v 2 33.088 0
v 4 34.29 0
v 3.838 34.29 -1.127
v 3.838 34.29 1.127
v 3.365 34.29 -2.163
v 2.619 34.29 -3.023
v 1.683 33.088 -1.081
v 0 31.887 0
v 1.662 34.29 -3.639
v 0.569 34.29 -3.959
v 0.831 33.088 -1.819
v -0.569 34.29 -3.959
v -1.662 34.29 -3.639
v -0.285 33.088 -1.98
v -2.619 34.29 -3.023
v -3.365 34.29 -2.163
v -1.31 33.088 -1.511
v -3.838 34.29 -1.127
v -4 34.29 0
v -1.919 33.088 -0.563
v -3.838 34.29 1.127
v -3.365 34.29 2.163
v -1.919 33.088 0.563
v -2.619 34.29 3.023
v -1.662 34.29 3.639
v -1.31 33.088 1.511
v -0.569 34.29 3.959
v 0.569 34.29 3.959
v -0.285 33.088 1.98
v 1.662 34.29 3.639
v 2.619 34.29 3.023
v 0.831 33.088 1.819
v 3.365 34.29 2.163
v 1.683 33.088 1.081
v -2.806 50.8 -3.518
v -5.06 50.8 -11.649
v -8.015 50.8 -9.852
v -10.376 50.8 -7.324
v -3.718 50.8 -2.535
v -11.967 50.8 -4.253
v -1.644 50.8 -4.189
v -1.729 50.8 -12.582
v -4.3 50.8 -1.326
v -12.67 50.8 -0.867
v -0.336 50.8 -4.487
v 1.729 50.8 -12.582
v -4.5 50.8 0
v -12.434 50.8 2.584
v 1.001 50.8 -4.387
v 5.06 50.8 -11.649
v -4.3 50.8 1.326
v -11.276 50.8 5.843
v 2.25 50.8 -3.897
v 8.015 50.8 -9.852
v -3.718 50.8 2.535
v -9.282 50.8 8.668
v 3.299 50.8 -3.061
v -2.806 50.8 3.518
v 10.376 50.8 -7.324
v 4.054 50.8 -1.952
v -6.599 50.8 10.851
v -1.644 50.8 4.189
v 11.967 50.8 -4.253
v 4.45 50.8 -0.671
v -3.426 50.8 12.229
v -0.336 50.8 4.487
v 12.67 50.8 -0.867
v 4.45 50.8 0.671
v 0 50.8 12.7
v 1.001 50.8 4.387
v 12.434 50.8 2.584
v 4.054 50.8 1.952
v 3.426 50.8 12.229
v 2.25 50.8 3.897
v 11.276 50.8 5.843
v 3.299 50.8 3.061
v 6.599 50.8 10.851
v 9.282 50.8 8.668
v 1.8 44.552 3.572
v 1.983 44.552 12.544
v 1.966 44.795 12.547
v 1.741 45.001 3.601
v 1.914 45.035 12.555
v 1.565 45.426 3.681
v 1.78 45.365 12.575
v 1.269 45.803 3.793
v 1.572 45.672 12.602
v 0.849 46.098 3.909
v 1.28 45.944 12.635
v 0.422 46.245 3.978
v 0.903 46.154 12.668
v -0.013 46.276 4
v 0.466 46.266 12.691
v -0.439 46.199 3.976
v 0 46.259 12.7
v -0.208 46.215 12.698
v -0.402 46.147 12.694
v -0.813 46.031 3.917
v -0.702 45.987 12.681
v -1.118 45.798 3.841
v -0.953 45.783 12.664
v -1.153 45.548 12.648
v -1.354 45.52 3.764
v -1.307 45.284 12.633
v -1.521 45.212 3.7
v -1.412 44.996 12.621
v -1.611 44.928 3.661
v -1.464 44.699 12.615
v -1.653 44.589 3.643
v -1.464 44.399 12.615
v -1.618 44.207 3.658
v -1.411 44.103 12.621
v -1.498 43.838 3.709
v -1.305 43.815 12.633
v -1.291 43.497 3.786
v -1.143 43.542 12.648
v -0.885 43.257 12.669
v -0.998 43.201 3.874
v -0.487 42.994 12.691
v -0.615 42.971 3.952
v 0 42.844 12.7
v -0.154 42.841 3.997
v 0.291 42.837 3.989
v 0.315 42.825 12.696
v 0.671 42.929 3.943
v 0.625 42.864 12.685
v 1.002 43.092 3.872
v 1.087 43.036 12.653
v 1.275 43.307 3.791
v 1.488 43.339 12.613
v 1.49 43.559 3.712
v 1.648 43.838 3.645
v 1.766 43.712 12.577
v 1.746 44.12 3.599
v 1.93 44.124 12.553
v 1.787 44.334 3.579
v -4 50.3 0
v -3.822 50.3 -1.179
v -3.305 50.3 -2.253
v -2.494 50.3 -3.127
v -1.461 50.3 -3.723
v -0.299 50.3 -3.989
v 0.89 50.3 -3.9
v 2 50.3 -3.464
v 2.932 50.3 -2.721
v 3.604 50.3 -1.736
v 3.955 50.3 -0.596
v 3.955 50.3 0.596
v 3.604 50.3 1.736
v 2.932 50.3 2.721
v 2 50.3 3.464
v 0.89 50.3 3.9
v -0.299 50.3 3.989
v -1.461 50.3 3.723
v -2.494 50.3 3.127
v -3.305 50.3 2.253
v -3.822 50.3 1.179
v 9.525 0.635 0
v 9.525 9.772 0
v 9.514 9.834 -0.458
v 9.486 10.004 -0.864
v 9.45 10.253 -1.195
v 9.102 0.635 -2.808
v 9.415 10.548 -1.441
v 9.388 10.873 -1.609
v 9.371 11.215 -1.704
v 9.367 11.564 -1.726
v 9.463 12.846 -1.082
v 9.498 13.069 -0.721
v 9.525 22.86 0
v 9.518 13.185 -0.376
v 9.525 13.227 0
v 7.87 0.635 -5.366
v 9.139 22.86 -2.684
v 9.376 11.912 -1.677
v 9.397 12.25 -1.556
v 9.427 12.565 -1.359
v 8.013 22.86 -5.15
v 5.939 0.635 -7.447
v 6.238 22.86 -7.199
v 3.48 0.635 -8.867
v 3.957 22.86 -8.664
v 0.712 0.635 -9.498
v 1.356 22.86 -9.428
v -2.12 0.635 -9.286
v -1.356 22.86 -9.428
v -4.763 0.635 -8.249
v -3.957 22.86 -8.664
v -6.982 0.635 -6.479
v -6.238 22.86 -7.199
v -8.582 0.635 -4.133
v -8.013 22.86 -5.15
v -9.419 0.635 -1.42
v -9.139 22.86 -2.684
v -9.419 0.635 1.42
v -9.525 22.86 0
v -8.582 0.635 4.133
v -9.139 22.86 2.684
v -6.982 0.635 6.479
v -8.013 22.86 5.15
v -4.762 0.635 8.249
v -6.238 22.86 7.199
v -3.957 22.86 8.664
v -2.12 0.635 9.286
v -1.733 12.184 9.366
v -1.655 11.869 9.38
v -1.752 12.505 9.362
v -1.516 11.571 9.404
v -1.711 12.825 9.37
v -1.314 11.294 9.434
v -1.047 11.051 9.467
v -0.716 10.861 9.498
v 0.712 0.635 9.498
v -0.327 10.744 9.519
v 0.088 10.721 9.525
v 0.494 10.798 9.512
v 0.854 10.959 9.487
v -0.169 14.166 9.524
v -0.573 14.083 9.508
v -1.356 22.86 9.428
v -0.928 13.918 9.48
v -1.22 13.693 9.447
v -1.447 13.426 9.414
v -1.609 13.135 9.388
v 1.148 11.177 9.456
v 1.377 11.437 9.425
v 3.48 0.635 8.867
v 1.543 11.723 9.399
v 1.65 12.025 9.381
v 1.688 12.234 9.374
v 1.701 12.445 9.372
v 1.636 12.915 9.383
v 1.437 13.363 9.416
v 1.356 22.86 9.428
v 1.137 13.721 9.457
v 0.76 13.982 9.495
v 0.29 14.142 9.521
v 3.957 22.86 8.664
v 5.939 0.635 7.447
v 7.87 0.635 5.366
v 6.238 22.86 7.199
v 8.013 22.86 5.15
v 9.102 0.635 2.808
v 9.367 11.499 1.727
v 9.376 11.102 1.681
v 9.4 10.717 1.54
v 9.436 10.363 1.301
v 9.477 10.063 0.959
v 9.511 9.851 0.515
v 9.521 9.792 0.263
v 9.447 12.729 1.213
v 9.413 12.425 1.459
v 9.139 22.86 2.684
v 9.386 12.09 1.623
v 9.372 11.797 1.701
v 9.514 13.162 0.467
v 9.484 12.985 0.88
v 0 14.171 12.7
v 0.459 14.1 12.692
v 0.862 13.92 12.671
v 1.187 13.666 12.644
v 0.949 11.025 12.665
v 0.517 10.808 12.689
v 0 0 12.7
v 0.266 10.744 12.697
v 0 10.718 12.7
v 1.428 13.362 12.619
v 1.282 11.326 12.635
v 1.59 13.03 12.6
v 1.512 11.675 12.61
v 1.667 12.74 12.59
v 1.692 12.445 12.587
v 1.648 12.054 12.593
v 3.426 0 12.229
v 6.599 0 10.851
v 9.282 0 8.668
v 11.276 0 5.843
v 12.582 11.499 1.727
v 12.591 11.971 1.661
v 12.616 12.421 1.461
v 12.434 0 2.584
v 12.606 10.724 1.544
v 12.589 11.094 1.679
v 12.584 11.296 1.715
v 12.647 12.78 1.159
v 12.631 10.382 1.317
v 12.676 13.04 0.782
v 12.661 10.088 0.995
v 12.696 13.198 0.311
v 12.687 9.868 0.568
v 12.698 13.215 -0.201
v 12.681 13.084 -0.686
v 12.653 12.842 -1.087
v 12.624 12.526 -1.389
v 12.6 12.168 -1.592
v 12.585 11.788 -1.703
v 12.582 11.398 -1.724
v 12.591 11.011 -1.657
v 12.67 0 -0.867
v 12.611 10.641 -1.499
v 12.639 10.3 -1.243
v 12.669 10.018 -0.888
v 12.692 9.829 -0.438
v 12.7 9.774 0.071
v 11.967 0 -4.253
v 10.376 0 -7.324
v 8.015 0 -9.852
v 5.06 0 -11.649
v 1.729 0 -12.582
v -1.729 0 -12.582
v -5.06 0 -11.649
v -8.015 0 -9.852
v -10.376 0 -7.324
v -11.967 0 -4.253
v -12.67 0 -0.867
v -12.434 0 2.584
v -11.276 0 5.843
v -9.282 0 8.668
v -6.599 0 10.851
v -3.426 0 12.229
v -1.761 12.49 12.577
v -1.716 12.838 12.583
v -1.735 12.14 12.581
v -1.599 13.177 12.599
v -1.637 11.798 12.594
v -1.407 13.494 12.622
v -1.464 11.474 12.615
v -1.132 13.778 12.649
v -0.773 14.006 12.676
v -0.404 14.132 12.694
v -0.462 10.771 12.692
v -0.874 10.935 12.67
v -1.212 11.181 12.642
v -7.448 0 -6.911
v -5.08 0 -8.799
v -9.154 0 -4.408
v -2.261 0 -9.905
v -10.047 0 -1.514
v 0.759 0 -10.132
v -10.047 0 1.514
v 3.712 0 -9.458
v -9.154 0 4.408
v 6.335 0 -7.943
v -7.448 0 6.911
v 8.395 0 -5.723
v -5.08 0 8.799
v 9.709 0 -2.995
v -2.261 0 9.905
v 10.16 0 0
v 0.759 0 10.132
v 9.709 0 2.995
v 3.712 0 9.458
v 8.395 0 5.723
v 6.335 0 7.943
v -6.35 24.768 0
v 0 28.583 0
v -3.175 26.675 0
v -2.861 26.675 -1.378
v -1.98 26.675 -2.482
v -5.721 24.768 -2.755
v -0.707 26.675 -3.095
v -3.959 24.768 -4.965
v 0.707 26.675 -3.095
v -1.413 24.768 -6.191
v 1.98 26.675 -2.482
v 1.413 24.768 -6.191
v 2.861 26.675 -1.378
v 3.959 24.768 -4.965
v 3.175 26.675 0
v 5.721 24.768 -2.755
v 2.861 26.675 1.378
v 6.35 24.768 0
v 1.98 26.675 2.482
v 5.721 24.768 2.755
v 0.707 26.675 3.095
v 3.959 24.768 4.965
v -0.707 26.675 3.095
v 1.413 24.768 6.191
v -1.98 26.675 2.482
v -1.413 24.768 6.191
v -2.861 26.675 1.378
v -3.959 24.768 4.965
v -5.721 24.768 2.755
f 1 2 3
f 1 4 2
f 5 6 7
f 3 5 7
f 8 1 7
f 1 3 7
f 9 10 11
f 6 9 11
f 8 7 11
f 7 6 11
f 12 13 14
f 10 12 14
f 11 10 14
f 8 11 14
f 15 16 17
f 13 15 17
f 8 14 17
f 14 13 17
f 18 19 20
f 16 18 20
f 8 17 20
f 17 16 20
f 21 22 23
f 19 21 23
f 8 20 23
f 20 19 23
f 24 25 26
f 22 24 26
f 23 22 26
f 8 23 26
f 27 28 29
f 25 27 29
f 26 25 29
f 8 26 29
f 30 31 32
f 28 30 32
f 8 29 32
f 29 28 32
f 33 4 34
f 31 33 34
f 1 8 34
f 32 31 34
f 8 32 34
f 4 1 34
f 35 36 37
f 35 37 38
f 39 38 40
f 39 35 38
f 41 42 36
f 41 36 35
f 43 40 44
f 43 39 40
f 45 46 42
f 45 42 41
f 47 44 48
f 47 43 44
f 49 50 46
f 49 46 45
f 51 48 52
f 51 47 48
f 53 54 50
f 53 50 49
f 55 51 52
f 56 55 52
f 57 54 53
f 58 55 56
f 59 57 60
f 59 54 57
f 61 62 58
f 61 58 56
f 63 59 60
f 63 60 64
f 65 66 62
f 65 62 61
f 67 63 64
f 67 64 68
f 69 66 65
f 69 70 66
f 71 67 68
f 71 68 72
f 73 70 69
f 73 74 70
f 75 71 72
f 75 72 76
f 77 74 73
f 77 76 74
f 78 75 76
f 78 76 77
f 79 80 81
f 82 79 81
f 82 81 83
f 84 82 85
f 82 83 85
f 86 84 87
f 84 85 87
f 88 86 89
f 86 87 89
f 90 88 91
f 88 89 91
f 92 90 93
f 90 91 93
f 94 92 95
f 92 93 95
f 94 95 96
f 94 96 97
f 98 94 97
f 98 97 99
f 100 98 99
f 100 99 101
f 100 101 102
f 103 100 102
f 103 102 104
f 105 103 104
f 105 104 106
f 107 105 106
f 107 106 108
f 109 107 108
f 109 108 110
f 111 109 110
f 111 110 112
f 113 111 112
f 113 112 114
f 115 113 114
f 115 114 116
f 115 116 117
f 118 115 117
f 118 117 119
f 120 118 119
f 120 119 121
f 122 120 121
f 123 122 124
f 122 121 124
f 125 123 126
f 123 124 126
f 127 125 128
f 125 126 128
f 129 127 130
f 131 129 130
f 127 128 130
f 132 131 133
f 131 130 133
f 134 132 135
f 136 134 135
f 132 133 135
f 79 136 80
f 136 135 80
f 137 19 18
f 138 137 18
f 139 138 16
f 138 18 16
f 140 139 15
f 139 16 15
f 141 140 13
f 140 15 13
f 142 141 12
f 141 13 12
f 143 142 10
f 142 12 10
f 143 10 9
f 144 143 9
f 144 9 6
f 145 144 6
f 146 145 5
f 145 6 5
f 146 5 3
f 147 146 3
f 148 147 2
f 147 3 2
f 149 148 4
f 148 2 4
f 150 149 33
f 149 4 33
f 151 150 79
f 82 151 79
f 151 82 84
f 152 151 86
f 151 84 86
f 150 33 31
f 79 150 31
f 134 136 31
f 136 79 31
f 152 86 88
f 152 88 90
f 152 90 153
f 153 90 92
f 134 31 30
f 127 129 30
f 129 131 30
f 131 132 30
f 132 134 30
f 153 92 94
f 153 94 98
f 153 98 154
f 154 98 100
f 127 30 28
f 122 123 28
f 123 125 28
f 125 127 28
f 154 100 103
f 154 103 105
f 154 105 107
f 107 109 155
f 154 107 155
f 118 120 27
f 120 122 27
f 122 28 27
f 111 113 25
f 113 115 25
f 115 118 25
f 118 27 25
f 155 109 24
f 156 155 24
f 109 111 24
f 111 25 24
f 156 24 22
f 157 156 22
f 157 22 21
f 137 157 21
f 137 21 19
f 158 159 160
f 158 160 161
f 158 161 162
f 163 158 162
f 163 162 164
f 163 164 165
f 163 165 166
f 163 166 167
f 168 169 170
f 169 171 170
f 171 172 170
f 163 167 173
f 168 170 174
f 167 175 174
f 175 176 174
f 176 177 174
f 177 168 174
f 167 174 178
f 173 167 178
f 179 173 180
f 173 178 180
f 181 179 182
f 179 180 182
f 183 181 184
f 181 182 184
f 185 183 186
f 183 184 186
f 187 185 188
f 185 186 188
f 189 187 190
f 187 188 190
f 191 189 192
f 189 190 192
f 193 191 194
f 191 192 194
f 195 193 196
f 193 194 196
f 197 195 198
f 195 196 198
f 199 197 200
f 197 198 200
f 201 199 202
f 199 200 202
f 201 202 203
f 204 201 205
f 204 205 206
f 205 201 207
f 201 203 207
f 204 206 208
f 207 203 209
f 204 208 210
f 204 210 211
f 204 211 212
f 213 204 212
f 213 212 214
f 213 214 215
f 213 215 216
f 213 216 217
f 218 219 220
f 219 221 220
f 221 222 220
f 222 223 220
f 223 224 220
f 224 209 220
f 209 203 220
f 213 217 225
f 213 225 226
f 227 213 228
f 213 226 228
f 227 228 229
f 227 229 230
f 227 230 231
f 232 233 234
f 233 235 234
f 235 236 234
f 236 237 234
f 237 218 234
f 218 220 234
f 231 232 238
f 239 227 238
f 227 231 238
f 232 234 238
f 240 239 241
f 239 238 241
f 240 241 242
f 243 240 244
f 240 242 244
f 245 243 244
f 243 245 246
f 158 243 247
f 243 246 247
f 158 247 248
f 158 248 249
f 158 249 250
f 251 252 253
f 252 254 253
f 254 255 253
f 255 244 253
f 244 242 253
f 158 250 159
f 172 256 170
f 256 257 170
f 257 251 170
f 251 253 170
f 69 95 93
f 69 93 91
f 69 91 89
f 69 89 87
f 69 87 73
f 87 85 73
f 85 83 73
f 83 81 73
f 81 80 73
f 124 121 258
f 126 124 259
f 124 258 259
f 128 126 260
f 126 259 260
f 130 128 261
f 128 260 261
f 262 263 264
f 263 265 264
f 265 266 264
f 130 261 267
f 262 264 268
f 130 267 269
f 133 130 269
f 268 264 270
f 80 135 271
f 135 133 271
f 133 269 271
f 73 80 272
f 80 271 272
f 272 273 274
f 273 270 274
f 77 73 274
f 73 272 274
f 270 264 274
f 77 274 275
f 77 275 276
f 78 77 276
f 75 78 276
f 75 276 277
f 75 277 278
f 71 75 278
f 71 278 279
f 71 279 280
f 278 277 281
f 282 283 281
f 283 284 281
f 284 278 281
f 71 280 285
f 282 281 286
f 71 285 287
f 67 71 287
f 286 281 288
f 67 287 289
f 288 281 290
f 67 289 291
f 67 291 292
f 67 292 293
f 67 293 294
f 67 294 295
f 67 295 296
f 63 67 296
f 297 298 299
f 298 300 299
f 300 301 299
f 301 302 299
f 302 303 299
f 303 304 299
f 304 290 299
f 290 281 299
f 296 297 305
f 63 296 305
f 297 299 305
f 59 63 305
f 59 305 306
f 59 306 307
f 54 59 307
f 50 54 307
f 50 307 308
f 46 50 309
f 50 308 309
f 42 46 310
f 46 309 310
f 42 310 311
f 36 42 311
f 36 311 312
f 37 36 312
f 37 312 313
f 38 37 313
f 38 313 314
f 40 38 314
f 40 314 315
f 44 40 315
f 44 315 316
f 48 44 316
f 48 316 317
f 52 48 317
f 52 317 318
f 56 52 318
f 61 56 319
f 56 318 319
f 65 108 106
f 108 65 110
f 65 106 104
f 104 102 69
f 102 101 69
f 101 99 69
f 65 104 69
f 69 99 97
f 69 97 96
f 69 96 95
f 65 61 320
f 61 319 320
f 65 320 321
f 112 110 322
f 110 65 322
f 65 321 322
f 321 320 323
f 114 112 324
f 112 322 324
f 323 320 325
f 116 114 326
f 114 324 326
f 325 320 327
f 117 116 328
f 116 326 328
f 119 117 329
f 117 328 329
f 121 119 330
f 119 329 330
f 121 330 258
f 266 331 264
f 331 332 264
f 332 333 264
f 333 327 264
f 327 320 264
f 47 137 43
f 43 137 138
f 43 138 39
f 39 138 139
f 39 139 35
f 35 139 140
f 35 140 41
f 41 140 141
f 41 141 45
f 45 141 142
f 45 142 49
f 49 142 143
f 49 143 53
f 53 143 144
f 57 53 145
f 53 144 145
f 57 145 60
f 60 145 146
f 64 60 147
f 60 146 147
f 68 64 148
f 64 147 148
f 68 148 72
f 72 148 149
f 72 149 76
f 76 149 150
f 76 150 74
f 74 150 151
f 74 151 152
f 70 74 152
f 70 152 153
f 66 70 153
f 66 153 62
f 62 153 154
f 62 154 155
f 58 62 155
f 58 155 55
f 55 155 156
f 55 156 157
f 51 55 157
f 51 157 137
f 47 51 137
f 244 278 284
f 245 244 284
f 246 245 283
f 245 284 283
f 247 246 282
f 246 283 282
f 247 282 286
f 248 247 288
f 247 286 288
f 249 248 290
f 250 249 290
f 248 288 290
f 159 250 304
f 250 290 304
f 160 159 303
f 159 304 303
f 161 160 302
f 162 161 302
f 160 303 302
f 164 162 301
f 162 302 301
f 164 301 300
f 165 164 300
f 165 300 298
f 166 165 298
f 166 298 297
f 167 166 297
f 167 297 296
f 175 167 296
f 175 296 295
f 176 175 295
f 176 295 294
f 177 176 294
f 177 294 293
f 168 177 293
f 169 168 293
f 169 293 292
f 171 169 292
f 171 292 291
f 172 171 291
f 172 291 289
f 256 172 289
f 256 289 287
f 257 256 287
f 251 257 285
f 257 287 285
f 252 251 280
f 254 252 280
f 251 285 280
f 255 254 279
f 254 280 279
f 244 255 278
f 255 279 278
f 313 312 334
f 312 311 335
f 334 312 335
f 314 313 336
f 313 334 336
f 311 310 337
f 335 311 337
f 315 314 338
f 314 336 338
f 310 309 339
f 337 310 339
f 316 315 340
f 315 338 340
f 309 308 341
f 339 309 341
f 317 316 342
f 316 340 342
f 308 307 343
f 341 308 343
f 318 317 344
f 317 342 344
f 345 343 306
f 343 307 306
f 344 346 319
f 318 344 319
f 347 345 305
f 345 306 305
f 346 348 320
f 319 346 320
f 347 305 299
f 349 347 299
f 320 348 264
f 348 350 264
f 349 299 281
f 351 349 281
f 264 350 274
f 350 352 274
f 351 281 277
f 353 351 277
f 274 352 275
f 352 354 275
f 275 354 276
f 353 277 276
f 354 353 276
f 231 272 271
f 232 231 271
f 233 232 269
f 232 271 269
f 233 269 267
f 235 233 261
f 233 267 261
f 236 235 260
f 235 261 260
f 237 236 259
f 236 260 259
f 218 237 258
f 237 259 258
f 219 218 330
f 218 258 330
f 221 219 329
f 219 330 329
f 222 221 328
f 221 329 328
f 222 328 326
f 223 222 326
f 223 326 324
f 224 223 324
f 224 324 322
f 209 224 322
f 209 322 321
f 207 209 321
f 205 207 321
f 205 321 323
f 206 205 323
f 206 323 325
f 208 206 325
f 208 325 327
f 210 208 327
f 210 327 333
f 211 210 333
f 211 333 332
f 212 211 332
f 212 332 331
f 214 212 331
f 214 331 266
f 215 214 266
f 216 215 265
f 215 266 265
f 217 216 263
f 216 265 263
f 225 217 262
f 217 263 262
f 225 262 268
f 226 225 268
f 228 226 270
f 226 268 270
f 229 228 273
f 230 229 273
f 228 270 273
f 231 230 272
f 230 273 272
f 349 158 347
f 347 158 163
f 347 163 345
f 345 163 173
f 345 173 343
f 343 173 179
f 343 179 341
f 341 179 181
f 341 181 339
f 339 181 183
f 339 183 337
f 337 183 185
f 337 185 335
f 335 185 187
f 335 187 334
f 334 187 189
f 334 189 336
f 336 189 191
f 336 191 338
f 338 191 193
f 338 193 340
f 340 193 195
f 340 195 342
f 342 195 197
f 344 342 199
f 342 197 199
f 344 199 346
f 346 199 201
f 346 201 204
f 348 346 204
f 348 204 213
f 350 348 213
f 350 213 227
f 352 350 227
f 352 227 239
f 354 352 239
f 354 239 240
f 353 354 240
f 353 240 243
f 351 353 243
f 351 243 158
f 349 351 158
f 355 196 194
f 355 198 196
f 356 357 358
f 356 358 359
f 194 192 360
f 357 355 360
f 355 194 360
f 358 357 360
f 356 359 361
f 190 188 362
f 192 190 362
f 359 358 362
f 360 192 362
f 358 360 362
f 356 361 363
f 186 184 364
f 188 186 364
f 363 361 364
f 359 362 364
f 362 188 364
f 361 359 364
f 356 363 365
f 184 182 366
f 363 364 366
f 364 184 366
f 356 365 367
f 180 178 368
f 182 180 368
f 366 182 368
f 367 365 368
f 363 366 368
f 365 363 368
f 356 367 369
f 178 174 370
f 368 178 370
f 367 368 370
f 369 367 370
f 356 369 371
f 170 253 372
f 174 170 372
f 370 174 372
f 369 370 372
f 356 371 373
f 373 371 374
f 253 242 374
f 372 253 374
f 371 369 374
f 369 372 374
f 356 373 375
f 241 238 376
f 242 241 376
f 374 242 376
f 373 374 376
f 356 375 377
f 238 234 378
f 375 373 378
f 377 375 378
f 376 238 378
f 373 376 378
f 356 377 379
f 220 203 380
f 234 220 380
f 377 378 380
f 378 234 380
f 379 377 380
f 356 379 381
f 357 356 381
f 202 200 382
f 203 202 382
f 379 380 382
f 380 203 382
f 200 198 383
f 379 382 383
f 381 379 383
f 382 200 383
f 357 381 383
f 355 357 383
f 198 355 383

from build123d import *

# Parameters (mm, degrees)
SKETCH1_R                             = 12.7
BOSS_EXTRUDE1_DEPTH                   = 50.8
F_8_0_8_DIAMETER_HOLE1_D              = 8
F_8_0_8_DIAMETER_HOLE1_DEPTH          = 16.51
F_8_0_8_DIAMETER_HOLE1_CSINK_D        = 9
F_8_0_8_DIAMETER_HOLE1_CSINK_ANGLE    = 90
F_8_0_8_DIAMETER_HOLE1_TIP            = 2.403442476
F_8_32_TAPPED_HOLE1_REACH             = 54.894
F_8_32_TAPPED_HOLE1_BORE_R            = 1.7272
F_3_4_0_75_DIAMETER_HOLE1_D           = 19.05
F_3_4_0_75_DIAMETER_HOLE1_DEPTH       = 22.86
F_3_4_0_75_DIAMETER_HOLE1_CSINK_D     = 20.32
F_3_4_0_75_DIAMETER_HOLE1_CSINK_ANGLE = 90
F_3_4_0_75_DIAMETER_HOLE1_TIP         = 5.723197396
TAP_DRILL_FOR_8_32_TAP1_REACH         = 49.733
TAP_DRILL_FOR_8_32_TAP1_BORE_R        = 1.7272
TAP_DRILL_FOR_8_32_TAP2_REACH         = 50.487
TAP_DRILL_FOR_8_32_TAP2_BORE_R        = 1.7272


with BuildPart() as part:
    # Sketch1 → Boss-Extrude1 (new body)
    with BuildSketch(Plane(origin=(0, 0, 0), x_dir=(1, 0, 0), z_dir=(0, 1, 0))):
        with Locations(Location((0, 0, 0), (0, 0, 270))):
            Circle(SKETCH1_R)
    extrude(amount=BOSS_EXTRUDE1_DEPTH)

    # Ø8.0 (8) Diameter Hole1
    with Locations(Plane(origin=(0, 50.8, 0), x_dir=(1, 0, 0), z_dir=(0, 1, 0))):
        with Locations((0, 0)):
            CounterSinkHole(F_8_0_8_DIAMETER_HOLE1_D / 2, F_8_0_8_DIAMETER_HOLE1_CSINK_D / 2, depth=F_8_0_8_DIAMETER_HOLE1_DEPTH, counter_sink_angle=F_8_0_8_DIAMETER_HOLE1_CSINK_ANGLE)
            with Locations((0, 0, -(F_8_0_8_DIAMETER_HOLE1_DEPTH + F_8_0_8_DIAMETER_HOLE1_TIP / 2))):  # 118° drill point
                Cone(0, F_8_0_8_DIAMETER_HOLE1_D / 2, F_8_0_8_DIAMETER_HOLE1_TIP, mode=Mode.SUBTRACT)

    # #8-32 Tapped Hole1 bore (on position points) → #8-32 Tapped Hole1 (cut, up to next)
    with BuildSketch(Plane(origin=(0.258881907, 44.551690017, 12.697361149), x_dir=(0.999792216488, 0, -0.020384402145), z_dir=(0.020384402145, 0, 0.999792216488)), mode=Mode.PRIVATE) as f_8_32_tapped_hole1_sk1:
        Circle(F_8_32_TAPPED_HOLE1_BORE_R)
    f_8_32_tapped_hole1_tool1 = extrude(f_8_32_tapped_hole1_sk1.sketch, amount=-F_8_32_TAPPED_HOLE1_REACH, mode=Mode.PRIVATE) & part.part
    add(f_8_32_tapped_hole1_tool1.solids().sort_by_distance((0.258882, 44.55169, 12.697361))[0], mode=Mode.SUBTRACT)

    # 3/4 (0.75) Diameter Hole1
    with Locations(Plane(origin=(0, 0, 0), x_dir=(-1, 0, 0), z_dir=(0, -1, 0))):
        with Locations((0, 0)):
            CounterSinkHole(F_3_4_0_75_DIAMETER_HOLE1_D / 2, F_3_4_0_75_DIAMETER_HOLE1_CSINK_D / 2, depth=F_3_4_0_75_DIAMETER_HOLE1_DEPTH, counter_sink_angle=F_3_4_0_75_DIAMETER_HOLE1_CSINK_ANGLE)
            with Locations((0, 0, -(F_3_4_0_75_DIAMETER_HOLE1_DEPTH + F_3_4_0_75_DIAMETER_HOLE1_TIP / 2))):  # 118° drill point
                Cone(0, F_3_4_0_75_DIAMETER_HOLE1_D / 2, F_3_4_0_75_DIAMETER_HOLE1_TIP, mode=Mode.SUBTRACT)

    # Tap Drill for #8-32 Tap1 bore (on position points) → Tap Drill for #8-32 Tap1 (cut, up to next)
    with BuildSketch(Plane(origin=(-0.035098468, 12.444517797, 12.6999515), x_dir=(0.999996181087, 0, 0.002763658925), z_dir=(-0.002763658925, 0, 0.999996181087)), mode=Mode.PRIVATE) as tap_drill_for_8_32_tap1_sk1:
        Circle(TAP_DRILL_FOR_8_32_TAP1_BORE_R)
    tap_drill_for_8_32_tap1_tool1 = extrude(tap_drill_for_8_32_tap1_sk1.sketch, amount=-TAP_DRILL_FOR_8_32_TAP1_REACH, mode=Mode.PRIVATE) & part.part
    add(tap_drill_for_8_32_tap1_tool1.solids().sort_by_distance((-0.035098, 12.444518, 12.699951))[0], mode=Mode.SUBTRACT)

    # Tap Drill for #8-32 Tap2 bore (on position points) → Tap Drill for #8-32 Tap2 (cut, up to next)
    with BuildSketch(Plane(origin=(12.7, 11.499385571, 0), x_dir=(0, 0, 1), z_dir=(1, 0, 0)), mode=Mode.PRIVATE) as tap_drill_for_8_32_tap2_sk1:
        Circle(TAP_DRILL_FOR_8_32_TAP2_BORE_R)
    tap_drill_for_8_32_tap2_tool1 = extrude(tap_drill_for_8_32_tap2_sk1.sketch, amount=-TAP_DRILL_FOR_8_32_TAP2_REACH, mode=Mode.PRIVATE) & part.part
    add(tap_drill_for_8_32_tap2_tool1.solids().sort_by_distance((12.7, 11.499386, 0))[0], mode=Mode.SUBTRACT)


solid = part.part
